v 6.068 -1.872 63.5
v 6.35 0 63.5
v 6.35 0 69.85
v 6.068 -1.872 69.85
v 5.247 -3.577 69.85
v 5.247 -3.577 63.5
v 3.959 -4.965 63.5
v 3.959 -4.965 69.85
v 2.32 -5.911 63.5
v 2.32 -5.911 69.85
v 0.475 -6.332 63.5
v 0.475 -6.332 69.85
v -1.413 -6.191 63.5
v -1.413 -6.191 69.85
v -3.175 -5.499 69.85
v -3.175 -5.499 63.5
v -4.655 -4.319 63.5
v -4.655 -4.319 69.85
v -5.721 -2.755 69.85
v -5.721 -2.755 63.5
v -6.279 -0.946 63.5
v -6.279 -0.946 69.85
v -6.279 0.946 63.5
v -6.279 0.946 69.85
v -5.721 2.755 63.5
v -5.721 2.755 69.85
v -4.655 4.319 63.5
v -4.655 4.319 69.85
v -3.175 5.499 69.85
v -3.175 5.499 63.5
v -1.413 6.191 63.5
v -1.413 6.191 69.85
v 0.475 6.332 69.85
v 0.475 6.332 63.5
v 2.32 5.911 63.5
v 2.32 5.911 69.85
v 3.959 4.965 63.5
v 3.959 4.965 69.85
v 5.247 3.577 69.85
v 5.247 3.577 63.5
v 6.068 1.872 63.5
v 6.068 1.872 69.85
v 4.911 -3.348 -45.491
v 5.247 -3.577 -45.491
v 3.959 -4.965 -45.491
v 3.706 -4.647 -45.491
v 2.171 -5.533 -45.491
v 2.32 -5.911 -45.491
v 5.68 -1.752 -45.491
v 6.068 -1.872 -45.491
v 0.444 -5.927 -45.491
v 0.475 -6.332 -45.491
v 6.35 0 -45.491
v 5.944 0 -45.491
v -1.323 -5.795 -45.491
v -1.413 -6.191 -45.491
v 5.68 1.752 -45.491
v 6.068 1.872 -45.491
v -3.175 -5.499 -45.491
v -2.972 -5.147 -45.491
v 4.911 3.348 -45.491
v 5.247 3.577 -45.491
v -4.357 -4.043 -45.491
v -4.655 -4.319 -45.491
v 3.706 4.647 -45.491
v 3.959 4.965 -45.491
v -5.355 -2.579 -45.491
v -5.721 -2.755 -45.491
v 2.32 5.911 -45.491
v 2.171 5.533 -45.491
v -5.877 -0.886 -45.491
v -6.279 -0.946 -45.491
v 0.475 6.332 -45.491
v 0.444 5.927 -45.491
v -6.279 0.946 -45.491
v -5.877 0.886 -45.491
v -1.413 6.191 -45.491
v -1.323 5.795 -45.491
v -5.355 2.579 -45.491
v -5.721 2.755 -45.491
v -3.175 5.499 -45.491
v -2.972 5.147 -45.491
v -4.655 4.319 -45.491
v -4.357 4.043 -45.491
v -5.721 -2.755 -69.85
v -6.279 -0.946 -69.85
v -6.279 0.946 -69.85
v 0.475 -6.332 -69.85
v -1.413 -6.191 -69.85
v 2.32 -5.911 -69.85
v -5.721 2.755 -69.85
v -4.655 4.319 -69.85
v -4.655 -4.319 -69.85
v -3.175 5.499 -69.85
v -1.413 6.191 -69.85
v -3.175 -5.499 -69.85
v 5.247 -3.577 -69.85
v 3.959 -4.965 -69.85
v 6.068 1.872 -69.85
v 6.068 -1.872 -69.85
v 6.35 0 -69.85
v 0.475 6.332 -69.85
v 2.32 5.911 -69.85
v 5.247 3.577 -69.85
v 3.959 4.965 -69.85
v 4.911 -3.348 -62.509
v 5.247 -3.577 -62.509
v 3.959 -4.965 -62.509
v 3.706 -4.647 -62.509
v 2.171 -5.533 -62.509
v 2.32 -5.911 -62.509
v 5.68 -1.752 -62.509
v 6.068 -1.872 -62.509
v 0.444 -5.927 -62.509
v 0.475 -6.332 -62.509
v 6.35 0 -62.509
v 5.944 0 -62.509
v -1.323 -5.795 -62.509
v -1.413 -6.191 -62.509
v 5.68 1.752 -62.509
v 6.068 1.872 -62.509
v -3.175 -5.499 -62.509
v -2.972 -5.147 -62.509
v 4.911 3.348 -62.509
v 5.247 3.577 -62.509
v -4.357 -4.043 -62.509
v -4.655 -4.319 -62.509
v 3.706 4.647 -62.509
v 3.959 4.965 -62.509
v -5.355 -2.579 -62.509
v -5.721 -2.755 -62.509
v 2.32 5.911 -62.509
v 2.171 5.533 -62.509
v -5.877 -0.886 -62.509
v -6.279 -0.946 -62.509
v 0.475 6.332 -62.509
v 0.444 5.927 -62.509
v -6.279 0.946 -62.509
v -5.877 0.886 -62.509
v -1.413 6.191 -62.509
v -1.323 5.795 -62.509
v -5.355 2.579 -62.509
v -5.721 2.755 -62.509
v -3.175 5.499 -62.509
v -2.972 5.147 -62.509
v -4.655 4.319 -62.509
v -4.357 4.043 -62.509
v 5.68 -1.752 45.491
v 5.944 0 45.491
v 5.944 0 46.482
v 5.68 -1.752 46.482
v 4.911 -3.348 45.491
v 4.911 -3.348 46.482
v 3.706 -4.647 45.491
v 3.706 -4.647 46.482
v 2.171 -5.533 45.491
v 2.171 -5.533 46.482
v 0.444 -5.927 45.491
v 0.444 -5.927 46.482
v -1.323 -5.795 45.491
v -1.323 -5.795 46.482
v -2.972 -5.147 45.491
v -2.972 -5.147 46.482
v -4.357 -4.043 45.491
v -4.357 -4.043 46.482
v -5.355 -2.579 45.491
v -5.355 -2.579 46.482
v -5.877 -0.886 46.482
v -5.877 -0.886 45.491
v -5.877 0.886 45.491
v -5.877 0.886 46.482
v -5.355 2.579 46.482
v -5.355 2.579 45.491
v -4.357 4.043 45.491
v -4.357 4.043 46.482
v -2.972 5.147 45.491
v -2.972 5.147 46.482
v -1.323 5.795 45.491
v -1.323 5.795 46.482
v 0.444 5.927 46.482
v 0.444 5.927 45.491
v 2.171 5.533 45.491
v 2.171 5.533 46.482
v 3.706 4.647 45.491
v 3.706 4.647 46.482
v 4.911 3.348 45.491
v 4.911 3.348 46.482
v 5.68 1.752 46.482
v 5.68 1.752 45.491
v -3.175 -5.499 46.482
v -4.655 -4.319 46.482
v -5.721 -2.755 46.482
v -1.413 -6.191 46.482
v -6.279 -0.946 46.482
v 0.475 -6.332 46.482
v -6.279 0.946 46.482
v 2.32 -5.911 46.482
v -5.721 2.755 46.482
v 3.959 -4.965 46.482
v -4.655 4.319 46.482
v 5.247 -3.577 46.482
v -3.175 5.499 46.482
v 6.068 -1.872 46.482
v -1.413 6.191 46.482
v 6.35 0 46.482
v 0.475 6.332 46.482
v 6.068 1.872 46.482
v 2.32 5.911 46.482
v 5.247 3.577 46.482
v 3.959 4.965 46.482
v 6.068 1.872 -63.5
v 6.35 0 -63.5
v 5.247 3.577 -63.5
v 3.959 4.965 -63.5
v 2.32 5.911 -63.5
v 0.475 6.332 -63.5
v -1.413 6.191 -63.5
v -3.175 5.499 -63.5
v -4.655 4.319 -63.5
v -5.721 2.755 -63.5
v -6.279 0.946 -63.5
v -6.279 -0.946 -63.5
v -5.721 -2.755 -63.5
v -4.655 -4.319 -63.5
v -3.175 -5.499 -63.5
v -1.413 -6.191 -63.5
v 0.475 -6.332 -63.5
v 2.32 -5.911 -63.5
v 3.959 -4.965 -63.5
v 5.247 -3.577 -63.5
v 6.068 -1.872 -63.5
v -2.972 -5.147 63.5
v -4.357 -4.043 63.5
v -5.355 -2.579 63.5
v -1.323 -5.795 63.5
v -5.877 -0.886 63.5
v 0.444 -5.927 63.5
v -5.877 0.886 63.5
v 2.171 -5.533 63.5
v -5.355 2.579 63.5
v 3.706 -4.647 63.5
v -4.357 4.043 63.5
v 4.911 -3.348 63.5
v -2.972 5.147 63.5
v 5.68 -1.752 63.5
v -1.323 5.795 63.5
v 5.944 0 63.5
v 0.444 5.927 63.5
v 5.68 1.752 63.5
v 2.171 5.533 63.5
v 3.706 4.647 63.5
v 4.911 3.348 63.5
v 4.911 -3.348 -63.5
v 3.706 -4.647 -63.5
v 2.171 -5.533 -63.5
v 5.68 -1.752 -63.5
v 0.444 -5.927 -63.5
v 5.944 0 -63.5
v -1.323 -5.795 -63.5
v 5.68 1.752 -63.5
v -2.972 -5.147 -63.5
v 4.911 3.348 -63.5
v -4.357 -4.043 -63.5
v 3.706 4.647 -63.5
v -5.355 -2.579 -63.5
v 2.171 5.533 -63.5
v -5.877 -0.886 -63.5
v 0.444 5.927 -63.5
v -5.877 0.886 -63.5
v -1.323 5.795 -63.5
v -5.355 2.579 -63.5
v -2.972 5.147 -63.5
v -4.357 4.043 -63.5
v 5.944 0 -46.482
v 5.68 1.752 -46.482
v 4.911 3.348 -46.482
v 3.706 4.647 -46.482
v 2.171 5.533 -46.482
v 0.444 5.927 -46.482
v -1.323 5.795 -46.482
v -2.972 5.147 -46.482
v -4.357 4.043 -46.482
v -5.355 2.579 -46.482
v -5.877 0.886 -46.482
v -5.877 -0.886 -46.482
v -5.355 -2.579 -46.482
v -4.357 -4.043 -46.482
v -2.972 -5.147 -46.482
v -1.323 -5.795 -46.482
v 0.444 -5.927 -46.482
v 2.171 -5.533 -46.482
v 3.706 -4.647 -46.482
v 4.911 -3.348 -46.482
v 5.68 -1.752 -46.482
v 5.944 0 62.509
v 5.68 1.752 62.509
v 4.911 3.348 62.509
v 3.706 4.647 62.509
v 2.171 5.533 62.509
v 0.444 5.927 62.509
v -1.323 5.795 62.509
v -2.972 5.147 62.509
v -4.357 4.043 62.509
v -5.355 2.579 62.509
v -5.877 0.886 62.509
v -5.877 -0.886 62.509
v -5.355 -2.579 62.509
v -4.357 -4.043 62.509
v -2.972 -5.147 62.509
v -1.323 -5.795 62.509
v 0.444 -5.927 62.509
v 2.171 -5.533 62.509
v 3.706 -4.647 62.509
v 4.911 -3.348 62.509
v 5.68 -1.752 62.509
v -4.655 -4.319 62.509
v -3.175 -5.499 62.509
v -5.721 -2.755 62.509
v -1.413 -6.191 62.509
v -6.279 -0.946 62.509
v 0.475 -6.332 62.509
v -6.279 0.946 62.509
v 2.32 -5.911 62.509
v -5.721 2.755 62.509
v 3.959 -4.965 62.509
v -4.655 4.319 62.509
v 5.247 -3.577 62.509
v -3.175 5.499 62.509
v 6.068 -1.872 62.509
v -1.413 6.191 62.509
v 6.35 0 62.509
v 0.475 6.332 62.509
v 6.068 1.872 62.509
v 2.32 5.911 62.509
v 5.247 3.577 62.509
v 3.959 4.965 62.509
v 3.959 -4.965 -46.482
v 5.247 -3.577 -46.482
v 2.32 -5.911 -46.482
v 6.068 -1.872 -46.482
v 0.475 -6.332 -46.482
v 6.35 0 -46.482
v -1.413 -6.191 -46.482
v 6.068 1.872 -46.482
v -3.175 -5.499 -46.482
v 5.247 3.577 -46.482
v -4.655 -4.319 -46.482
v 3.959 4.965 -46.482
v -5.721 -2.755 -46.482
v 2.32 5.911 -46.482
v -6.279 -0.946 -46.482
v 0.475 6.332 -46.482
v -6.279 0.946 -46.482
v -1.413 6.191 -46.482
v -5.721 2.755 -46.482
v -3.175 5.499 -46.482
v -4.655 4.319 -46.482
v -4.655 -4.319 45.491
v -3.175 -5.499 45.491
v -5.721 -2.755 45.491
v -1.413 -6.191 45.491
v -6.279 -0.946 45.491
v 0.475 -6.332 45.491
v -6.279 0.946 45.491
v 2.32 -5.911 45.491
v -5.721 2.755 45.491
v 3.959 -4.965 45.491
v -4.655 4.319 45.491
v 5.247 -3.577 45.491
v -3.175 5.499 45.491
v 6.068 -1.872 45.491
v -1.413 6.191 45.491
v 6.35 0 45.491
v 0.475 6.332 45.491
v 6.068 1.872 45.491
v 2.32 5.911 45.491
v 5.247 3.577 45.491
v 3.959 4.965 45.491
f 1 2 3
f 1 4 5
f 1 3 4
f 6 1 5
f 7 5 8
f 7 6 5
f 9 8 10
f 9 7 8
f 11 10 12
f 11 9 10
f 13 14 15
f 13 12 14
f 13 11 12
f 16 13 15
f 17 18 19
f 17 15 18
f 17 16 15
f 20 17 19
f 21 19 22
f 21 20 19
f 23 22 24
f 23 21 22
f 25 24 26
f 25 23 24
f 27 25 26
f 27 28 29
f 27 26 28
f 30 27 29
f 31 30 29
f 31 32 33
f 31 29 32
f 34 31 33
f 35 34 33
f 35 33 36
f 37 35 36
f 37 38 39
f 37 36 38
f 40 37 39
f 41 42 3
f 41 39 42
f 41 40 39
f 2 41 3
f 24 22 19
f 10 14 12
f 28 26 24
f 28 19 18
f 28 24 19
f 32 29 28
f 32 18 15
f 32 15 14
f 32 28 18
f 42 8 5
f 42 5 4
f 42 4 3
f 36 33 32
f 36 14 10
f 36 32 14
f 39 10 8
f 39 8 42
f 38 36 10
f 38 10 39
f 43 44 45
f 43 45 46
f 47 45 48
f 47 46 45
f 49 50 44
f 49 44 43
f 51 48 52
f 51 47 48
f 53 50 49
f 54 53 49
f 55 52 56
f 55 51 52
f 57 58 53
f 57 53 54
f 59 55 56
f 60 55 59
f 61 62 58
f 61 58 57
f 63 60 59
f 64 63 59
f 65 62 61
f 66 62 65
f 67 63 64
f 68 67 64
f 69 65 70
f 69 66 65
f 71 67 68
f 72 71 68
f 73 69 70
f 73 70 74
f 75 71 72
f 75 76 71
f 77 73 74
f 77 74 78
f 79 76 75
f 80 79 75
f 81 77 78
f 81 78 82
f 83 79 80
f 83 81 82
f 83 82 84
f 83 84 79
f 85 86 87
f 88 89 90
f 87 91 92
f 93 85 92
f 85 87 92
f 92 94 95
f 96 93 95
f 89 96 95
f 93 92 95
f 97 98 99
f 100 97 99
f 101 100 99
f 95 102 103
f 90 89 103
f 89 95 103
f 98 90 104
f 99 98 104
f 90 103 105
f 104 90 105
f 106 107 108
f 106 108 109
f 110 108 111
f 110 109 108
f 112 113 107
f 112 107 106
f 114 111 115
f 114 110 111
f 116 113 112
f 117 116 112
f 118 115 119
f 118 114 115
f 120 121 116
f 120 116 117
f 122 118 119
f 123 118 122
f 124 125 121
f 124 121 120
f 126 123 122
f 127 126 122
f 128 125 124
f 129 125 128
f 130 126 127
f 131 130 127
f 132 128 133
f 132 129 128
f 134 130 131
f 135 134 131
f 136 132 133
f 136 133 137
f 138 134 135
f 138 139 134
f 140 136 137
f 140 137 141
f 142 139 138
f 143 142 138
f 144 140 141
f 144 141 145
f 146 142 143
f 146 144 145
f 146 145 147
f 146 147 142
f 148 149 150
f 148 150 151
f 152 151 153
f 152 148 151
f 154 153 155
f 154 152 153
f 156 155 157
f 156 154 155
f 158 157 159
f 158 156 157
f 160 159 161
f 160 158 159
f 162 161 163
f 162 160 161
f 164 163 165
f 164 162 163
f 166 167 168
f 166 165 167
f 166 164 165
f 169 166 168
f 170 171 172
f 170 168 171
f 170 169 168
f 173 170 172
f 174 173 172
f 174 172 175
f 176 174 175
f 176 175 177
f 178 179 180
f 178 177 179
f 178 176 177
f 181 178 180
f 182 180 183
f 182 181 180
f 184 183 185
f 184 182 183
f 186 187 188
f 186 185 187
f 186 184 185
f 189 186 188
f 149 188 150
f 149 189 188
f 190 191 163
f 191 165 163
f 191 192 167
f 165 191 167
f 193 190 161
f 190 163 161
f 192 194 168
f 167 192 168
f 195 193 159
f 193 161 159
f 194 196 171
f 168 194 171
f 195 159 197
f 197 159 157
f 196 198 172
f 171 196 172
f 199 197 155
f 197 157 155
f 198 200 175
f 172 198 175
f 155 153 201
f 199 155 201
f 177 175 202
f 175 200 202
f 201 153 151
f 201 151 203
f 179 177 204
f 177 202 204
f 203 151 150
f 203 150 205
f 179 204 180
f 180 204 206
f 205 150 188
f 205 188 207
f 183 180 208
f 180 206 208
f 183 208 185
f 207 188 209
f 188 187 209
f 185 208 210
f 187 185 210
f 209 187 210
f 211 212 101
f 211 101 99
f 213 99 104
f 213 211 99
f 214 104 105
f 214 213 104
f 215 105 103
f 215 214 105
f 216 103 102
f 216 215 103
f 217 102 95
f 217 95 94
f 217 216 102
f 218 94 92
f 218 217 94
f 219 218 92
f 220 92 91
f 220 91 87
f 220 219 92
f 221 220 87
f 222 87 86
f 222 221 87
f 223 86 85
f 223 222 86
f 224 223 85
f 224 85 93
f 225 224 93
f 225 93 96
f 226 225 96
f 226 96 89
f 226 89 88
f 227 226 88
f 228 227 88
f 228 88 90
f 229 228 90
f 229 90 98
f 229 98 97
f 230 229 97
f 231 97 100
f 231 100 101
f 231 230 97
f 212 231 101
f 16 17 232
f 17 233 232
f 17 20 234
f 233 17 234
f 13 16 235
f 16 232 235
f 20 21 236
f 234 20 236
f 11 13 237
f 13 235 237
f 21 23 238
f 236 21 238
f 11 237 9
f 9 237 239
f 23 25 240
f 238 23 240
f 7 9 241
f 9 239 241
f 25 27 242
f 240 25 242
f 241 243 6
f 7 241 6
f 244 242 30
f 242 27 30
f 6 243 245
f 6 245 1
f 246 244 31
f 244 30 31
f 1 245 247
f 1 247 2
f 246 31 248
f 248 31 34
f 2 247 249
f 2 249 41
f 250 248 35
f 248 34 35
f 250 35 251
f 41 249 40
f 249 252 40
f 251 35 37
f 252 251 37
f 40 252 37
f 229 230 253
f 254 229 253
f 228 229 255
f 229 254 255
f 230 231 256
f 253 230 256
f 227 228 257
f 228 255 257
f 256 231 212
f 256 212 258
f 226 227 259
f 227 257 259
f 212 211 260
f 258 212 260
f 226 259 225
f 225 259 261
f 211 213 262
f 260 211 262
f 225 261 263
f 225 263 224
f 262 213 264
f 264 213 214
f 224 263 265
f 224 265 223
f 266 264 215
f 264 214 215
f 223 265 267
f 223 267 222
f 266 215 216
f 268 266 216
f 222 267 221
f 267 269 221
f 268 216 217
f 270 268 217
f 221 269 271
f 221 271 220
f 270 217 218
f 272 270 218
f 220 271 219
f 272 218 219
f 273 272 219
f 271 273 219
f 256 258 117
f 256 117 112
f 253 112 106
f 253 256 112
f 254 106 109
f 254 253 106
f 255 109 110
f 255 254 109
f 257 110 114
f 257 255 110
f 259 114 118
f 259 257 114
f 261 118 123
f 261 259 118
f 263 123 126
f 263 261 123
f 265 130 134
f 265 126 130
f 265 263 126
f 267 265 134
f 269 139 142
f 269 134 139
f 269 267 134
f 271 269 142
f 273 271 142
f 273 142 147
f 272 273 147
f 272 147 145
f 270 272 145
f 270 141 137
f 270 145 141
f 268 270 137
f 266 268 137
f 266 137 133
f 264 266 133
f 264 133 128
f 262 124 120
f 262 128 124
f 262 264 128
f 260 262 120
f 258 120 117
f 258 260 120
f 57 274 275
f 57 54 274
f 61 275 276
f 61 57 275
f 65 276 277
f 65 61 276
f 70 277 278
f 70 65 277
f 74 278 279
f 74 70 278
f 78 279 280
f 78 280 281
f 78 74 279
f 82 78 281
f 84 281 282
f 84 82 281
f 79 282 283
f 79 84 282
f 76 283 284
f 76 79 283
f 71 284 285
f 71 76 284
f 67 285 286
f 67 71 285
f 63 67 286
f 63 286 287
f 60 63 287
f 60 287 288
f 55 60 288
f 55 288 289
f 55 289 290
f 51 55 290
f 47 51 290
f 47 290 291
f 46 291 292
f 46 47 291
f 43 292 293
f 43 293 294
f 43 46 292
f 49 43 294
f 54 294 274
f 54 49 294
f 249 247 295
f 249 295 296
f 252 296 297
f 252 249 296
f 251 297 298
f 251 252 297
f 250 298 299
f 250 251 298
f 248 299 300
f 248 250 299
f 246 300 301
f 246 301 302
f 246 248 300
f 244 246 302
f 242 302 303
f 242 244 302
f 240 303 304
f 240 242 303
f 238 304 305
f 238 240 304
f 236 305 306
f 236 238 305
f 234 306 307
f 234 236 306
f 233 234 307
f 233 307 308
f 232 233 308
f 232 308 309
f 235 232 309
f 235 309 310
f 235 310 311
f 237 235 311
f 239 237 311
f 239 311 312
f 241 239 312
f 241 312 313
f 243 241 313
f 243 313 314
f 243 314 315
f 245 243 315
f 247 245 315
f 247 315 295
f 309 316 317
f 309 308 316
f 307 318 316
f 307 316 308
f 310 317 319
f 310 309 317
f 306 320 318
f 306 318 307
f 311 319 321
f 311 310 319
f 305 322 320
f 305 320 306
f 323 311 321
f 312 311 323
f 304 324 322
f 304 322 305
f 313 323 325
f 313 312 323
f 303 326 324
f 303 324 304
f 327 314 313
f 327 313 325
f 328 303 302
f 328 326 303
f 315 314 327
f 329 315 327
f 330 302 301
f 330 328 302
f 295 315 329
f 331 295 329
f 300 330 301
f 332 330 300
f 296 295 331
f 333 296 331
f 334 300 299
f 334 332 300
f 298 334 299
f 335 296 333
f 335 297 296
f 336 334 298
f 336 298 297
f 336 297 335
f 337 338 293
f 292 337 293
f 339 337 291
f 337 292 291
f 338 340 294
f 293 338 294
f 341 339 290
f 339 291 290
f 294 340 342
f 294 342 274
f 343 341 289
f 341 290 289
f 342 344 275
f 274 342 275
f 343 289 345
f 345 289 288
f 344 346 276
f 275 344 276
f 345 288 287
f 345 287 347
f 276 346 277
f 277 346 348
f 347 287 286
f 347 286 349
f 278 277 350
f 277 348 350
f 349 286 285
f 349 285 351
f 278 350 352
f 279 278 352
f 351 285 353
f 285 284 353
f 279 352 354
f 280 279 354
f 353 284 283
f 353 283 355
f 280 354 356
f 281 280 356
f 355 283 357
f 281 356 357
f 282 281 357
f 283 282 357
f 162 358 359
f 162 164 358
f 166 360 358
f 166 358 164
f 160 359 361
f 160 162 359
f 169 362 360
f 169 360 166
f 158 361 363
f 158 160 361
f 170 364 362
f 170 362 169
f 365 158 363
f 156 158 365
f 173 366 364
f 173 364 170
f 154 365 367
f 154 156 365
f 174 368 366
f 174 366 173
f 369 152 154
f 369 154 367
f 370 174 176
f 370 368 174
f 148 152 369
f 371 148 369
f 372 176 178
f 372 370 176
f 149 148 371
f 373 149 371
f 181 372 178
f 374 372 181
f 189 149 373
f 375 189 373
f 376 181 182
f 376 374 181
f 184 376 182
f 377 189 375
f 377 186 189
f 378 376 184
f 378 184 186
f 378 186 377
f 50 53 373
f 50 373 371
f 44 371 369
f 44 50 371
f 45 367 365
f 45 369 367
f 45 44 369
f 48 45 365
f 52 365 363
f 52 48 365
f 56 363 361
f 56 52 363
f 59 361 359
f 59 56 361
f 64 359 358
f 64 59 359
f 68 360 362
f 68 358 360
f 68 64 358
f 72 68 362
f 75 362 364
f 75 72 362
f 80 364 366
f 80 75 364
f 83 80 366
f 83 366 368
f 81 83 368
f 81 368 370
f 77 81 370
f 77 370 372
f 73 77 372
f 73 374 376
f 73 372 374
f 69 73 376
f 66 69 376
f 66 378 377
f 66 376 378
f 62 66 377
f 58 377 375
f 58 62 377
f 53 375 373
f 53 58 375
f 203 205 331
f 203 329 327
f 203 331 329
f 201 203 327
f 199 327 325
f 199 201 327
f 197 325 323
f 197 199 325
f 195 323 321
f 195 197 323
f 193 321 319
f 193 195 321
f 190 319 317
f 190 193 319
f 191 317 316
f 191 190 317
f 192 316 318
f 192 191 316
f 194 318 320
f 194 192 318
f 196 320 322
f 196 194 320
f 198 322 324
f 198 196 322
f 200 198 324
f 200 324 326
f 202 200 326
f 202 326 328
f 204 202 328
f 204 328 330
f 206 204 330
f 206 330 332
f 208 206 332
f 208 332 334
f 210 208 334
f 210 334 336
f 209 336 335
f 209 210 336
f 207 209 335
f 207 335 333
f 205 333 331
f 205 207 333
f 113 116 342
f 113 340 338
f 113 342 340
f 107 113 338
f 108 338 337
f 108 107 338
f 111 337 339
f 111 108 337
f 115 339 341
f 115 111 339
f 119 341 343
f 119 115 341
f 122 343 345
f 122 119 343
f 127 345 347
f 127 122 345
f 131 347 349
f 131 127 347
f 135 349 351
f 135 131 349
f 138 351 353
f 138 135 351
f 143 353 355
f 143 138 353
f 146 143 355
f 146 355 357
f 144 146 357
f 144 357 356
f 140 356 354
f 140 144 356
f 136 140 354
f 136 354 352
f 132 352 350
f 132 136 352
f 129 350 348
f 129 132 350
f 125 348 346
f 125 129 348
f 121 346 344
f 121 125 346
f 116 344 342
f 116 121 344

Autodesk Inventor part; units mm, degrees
ref_plane "YZ Plane" through (0, 0, 0) normal (1, 0, 0) x (0, 1, 0)
ref_plane "XZ Plane" through (0, 0, 0) normal (0, 1, 0) x (-1, 0, 0)
sketch "Sketch1" plane through (0, 0, 0) normal (0, 0, 1) x (1, 0, 0)
  circle A0 centre (0, 0) radius 6.35
  dimension "d0" = 12.7
extrude "Extrusion1" add sketch "Sketch1" along normal mid plane 139.7
ref_plane "Work Plane1" through (0, 0, 63.5) normal (0, 0, 1) x (1, 0, 0)
sketch "Sketch2" plane through (0, 0, 63.5) normal (0, 0, 1) x (1, 0, 0)
  circle A0 centre (0, 0) radius 6.35 projected
  circle A1 centre (0, 0) radius 6.35
  circle A2 centre (0, 0) radius 5.9436
  dimension "d4" = 12.7
  dimension "d5" = 11.8872
extrude "Extrusion2" cut sketch "Sketch2" against normal blind 0.9906
mirror "Mirror1" about plane through (0, 0, 0) normal (0, 0, 1) of "Extrusion2"
ref_plane "Work Plane3" through (0, 0, 45.4914) normal (0, 0, 1) x (1, 0, 0)
sketch "Sketch3" plane through (0, 0, 45.4914) normal (0, 0, 1) x (1, 0, 0)
  circle A0 centre (0, 0) radius 6.35 projected
  circle A1 centre (0, 0) radius 6.35
  circle A2 centre (0, 0) radius 5.9436
  dimension "d9" = 12.7
  dimension "d10" = 11.8872
extrude "Extrusion3" cut sketch "Sketch3" along normal blind 0.9906
mirror "Mirror2" about plane through (0, 0, 0) normal (0, 0, 1) of "Extrusion3"
ref_plane "Work Plane2" through (0, 0, -63.5) normal (0, 0, 1) x (1, 0, 0)
ref_plane "Work Plane4" through (0, 0, -45.4914) normal (0, 0, 1) x (1, 0, 0)
properties part number "Stick to Scoop .5in. Pin" material "Aluminum 6061"
